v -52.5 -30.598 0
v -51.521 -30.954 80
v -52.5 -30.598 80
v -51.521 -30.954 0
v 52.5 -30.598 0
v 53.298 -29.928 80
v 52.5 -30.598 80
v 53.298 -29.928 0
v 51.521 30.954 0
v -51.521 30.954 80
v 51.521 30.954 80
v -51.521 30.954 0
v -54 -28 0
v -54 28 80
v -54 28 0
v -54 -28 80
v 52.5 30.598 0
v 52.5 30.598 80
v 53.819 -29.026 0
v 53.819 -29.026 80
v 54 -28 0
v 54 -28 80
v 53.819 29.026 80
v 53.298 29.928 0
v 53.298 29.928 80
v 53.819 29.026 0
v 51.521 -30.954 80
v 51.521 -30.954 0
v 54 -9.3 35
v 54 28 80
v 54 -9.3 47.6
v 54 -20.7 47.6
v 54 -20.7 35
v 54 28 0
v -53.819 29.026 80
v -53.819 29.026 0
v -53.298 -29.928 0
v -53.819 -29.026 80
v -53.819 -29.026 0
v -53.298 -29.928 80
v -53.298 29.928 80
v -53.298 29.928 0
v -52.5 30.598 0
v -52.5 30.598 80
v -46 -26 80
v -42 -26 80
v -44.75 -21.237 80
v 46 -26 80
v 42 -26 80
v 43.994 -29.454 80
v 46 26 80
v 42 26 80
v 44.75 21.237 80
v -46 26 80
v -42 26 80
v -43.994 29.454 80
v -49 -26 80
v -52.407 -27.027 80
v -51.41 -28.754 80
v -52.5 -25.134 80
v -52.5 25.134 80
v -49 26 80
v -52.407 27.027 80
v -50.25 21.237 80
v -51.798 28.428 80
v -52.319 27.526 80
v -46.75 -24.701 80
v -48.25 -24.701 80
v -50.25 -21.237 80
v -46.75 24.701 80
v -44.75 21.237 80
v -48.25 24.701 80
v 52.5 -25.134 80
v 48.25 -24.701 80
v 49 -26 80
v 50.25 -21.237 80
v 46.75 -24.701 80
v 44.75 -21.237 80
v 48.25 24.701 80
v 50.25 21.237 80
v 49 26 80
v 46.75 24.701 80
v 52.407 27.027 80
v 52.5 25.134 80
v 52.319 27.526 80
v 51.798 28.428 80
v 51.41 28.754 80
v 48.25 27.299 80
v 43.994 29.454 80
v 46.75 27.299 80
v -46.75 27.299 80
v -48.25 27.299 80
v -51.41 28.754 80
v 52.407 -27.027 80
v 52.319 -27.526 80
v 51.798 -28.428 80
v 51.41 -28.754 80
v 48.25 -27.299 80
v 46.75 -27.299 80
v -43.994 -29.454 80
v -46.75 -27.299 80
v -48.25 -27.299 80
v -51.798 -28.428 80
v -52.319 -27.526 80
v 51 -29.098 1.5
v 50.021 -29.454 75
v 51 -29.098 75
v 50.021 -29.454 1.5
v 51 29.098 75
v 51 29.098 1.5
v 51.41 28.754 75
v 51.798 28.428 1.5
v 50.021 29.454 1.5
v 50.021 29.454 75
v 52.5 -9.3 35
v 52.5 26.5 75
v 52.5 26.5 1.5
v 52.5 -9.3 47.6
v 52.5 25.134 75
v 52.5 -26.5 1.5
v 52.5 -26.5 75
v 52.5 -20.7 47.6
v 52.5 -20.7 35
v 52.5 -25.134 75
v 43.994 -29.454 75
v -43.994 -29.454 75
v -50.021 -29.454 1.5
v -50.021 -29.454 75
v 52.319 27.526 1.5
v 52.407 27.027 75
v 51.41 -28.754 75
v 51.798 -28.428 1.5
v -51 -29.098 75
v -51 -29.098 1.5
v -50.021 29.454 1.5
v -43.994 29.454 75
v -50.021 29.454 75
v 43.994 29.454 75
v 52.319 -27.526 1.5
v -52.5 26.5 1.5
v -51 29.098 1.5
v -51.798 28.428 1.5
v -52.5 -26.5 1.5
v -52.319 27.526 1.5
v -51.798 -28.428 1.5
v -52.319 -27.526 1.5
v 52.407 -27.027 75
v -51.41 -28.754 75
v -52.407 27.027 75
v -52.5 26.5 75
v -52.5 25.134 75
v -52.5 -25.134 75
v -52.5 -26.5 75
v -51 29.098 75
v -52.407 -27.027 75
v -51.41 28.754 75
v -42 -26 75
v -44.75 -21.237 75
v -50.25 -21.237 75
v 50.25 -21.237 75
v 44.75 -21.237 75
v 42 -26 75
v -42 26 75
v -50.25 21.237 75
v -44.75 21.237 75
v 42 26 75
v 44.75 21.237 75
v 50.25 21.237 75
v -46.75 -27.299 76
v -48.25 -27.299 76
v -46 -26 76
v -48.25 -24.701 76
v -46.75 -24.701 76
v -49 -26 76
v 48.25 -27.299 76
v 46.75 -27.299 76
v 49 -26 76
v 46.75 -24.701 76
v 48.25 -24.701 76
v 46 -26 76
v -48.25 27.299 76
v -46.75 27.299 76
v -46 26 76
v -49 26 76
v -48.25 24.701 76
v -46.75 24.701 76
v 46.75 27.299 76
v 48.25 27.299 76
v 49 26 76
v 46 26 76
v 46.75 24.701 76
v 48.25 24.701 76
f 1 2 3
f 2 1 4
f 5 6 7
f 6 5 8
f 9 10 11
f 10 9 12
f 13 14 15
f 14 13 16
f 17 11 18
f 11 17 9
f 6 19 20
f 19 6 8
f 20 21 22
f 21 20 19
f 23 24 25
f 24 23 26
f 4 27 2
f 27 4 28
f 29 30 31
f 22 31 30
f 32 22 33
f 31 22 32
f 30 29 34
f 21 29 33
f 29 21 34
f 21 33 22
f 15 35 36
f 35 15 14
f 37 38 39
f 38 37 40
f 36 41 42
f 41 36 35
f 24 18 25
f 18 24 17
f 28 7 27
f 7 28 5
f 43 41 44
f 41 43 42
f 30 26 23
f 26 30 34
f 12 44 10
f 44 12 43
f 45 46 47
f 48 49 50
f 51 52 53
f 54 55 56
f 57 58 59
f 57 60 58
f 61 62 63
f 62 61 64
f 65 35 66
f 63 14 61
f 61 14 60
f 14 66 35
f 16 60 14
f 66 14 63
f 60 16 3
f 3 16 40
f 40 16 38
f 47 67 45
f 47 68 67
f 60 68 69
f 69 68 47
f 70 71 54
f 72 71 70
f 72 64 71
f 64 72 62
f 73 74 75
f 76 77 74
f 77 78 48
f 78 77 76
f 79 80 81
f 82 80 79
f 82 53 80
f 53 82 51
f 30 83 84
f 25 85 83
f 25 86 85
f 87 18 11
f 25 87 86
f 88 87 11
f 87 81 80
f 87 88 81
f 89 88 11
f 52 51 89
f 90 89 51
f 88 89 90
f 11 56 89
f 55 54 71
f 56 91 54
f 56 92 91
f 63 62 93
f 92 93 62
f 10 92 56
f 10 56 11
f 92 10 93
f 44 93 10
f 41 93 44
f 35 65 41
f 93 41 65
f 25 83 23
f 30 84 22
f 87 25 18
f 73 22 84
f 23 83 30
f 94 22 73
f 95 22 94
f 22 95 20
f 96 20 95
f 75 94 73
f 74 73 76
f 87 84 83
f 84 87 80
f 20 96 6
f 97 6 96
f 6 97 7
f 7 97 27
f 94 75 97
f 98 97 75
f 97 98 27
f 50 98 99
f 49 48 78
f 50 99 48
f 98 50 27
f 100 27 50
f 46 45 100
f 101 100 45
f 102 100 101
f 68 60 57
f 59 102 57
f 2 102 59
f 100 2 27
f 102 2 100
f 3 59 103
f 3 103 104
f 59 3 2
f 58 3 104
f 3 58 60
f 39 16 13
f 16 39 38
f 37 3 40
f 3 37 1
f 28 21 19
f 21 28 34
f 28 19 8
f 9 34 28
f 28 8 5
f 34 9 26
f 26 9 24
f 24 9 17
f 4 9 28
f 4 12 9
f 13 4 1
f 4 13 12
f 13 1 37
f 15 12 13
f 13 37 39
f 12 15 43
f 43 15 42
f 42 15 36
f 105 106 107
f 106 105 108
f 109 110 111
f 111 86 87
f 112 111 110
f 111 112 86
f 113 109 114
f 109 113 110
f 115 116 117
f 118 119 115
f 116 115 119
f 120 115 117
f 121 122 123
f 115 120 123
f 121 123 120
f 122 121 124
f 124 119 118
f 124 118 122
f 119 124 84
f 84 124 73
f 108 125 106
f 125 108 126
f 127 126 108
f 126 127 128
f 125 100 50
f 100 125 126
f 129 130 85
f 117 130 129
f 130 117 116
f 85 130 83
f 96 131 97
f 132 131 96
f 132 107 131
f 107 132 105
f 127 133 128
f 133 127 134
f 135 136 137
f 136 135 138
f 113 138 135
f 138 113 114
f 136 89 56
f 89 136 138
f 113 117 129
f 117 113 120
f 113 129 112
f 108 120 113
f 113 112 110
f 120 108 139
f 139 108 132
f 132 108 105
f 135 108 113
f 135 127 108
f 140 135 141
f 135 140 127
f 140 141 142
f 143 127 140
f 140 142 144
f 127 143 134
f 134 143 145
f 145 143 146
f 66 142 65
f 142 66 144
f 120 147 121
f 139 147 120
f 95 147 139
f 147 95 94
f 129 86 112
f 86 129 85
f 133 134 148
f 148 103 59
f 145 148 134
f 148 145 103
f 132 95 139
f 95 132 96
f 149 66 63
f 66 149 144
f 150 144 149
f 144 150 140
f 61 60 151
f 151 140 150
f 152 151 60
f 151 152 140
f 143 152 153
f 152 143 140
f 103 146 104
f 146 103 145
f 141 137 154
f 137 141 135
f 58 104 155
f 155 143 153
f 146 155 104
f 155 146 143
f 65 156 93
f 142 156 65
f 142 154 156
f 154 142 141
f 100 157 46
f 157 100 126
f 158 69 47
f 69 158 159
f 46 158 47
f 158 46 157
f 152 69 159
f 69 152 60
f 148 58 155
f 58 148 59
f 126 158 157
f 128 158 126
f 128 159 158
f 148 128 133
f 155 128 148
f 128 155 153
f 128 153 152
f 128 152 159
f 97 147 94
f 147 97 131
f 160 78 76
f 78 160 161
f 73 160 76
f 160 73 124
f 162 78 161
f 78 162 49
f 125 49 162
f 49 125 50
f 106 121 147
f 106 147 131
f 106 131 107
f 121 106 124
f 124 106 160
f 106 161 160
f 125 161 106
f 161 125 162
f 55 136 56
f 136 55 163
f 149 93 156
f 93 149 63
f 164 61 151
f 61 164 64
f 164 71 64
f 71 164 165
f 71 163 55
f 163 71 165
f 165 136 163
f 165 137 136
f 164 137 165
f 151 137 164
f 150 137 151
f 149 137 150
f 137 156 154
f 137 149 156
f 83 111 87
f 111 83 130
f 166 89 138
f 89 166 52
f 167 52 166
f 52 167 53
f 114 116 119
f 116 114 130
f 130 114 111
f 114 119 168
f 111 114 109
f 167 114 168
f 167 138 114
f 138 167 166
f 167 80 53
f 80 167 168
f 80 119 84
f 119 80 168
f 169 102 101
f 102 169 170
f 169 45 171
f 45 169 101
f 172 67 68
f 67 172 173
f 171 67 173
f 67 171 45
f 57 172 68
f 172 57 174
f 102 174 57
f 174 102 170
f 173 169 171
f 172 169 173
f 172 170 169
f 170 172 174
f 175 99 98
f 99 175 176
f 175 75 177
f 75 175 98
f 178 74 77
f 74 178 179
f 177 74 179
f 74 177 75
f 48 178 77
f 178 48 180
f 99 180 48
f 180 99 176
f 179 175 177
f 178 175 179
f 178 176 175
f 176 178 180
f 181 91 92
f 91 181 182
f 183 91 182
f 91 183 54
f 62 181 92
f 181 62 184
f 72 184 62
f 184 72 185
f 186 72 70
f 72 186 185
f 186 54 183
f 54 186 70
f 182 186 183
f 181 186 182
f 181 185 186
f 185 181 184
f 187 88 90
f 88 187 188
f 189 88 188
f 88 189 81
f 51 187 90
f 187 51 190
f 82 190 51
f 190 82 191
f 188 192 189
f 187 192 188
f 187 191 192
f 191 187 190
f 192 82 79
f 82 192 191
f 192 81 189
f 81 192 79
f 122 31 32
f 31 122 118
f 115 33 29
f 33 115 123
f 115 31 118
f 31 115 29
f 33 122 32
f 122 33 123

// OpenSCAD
difference(){
    union(){
        difference() {
            abox(108,62);
            translate([0,0,1.5]) abox(108-3,62-3);
            
            //translate([0,15,4]) abox(108-5-5,62-10-25,d=0);
        }
        pillas(95,52,r=5.5,d=0);
    }
    pillas(95,52,r=1.5,d=1);
    
    #translate([50,-62/2-1.5+11.8,35]) cube([100,11.2+0.2,12.4+0.2]);
}


module abox(w, h, r=3){
    w = w-r*2;
    h = h-r*2;
    t=80;
    translate([-w/2, -h/2, 0]) difference() {
        hull() {
            cylinder(t, r, r, $fn=18);
            translate([w, 0, 0]) cylinder(t, r, r, $fn=18);
            translate([0, h, 0]) cylinder(t, r, r, $fn=18);
            translate([w, h, 0]) cylinder(t, r, r, $fn=18);
        }
    }
}

module pillas(w, h, r=3, d=0) {
    a=0;
    t=5;
    translate([-w/2, -h/2, 80-5+d]) difference(){    
        union(){
            cylinder(t, r, r, $fn=6);
            translate([w, 0, 0]) cylinder(t, r, r, $fn=6);
            translate([0, h, 0]) cylinder(t, r, r, $fn=6);
            translate([w, h, 0]) cylinder(t, r, r, $fn=6);
        }
    }

}
